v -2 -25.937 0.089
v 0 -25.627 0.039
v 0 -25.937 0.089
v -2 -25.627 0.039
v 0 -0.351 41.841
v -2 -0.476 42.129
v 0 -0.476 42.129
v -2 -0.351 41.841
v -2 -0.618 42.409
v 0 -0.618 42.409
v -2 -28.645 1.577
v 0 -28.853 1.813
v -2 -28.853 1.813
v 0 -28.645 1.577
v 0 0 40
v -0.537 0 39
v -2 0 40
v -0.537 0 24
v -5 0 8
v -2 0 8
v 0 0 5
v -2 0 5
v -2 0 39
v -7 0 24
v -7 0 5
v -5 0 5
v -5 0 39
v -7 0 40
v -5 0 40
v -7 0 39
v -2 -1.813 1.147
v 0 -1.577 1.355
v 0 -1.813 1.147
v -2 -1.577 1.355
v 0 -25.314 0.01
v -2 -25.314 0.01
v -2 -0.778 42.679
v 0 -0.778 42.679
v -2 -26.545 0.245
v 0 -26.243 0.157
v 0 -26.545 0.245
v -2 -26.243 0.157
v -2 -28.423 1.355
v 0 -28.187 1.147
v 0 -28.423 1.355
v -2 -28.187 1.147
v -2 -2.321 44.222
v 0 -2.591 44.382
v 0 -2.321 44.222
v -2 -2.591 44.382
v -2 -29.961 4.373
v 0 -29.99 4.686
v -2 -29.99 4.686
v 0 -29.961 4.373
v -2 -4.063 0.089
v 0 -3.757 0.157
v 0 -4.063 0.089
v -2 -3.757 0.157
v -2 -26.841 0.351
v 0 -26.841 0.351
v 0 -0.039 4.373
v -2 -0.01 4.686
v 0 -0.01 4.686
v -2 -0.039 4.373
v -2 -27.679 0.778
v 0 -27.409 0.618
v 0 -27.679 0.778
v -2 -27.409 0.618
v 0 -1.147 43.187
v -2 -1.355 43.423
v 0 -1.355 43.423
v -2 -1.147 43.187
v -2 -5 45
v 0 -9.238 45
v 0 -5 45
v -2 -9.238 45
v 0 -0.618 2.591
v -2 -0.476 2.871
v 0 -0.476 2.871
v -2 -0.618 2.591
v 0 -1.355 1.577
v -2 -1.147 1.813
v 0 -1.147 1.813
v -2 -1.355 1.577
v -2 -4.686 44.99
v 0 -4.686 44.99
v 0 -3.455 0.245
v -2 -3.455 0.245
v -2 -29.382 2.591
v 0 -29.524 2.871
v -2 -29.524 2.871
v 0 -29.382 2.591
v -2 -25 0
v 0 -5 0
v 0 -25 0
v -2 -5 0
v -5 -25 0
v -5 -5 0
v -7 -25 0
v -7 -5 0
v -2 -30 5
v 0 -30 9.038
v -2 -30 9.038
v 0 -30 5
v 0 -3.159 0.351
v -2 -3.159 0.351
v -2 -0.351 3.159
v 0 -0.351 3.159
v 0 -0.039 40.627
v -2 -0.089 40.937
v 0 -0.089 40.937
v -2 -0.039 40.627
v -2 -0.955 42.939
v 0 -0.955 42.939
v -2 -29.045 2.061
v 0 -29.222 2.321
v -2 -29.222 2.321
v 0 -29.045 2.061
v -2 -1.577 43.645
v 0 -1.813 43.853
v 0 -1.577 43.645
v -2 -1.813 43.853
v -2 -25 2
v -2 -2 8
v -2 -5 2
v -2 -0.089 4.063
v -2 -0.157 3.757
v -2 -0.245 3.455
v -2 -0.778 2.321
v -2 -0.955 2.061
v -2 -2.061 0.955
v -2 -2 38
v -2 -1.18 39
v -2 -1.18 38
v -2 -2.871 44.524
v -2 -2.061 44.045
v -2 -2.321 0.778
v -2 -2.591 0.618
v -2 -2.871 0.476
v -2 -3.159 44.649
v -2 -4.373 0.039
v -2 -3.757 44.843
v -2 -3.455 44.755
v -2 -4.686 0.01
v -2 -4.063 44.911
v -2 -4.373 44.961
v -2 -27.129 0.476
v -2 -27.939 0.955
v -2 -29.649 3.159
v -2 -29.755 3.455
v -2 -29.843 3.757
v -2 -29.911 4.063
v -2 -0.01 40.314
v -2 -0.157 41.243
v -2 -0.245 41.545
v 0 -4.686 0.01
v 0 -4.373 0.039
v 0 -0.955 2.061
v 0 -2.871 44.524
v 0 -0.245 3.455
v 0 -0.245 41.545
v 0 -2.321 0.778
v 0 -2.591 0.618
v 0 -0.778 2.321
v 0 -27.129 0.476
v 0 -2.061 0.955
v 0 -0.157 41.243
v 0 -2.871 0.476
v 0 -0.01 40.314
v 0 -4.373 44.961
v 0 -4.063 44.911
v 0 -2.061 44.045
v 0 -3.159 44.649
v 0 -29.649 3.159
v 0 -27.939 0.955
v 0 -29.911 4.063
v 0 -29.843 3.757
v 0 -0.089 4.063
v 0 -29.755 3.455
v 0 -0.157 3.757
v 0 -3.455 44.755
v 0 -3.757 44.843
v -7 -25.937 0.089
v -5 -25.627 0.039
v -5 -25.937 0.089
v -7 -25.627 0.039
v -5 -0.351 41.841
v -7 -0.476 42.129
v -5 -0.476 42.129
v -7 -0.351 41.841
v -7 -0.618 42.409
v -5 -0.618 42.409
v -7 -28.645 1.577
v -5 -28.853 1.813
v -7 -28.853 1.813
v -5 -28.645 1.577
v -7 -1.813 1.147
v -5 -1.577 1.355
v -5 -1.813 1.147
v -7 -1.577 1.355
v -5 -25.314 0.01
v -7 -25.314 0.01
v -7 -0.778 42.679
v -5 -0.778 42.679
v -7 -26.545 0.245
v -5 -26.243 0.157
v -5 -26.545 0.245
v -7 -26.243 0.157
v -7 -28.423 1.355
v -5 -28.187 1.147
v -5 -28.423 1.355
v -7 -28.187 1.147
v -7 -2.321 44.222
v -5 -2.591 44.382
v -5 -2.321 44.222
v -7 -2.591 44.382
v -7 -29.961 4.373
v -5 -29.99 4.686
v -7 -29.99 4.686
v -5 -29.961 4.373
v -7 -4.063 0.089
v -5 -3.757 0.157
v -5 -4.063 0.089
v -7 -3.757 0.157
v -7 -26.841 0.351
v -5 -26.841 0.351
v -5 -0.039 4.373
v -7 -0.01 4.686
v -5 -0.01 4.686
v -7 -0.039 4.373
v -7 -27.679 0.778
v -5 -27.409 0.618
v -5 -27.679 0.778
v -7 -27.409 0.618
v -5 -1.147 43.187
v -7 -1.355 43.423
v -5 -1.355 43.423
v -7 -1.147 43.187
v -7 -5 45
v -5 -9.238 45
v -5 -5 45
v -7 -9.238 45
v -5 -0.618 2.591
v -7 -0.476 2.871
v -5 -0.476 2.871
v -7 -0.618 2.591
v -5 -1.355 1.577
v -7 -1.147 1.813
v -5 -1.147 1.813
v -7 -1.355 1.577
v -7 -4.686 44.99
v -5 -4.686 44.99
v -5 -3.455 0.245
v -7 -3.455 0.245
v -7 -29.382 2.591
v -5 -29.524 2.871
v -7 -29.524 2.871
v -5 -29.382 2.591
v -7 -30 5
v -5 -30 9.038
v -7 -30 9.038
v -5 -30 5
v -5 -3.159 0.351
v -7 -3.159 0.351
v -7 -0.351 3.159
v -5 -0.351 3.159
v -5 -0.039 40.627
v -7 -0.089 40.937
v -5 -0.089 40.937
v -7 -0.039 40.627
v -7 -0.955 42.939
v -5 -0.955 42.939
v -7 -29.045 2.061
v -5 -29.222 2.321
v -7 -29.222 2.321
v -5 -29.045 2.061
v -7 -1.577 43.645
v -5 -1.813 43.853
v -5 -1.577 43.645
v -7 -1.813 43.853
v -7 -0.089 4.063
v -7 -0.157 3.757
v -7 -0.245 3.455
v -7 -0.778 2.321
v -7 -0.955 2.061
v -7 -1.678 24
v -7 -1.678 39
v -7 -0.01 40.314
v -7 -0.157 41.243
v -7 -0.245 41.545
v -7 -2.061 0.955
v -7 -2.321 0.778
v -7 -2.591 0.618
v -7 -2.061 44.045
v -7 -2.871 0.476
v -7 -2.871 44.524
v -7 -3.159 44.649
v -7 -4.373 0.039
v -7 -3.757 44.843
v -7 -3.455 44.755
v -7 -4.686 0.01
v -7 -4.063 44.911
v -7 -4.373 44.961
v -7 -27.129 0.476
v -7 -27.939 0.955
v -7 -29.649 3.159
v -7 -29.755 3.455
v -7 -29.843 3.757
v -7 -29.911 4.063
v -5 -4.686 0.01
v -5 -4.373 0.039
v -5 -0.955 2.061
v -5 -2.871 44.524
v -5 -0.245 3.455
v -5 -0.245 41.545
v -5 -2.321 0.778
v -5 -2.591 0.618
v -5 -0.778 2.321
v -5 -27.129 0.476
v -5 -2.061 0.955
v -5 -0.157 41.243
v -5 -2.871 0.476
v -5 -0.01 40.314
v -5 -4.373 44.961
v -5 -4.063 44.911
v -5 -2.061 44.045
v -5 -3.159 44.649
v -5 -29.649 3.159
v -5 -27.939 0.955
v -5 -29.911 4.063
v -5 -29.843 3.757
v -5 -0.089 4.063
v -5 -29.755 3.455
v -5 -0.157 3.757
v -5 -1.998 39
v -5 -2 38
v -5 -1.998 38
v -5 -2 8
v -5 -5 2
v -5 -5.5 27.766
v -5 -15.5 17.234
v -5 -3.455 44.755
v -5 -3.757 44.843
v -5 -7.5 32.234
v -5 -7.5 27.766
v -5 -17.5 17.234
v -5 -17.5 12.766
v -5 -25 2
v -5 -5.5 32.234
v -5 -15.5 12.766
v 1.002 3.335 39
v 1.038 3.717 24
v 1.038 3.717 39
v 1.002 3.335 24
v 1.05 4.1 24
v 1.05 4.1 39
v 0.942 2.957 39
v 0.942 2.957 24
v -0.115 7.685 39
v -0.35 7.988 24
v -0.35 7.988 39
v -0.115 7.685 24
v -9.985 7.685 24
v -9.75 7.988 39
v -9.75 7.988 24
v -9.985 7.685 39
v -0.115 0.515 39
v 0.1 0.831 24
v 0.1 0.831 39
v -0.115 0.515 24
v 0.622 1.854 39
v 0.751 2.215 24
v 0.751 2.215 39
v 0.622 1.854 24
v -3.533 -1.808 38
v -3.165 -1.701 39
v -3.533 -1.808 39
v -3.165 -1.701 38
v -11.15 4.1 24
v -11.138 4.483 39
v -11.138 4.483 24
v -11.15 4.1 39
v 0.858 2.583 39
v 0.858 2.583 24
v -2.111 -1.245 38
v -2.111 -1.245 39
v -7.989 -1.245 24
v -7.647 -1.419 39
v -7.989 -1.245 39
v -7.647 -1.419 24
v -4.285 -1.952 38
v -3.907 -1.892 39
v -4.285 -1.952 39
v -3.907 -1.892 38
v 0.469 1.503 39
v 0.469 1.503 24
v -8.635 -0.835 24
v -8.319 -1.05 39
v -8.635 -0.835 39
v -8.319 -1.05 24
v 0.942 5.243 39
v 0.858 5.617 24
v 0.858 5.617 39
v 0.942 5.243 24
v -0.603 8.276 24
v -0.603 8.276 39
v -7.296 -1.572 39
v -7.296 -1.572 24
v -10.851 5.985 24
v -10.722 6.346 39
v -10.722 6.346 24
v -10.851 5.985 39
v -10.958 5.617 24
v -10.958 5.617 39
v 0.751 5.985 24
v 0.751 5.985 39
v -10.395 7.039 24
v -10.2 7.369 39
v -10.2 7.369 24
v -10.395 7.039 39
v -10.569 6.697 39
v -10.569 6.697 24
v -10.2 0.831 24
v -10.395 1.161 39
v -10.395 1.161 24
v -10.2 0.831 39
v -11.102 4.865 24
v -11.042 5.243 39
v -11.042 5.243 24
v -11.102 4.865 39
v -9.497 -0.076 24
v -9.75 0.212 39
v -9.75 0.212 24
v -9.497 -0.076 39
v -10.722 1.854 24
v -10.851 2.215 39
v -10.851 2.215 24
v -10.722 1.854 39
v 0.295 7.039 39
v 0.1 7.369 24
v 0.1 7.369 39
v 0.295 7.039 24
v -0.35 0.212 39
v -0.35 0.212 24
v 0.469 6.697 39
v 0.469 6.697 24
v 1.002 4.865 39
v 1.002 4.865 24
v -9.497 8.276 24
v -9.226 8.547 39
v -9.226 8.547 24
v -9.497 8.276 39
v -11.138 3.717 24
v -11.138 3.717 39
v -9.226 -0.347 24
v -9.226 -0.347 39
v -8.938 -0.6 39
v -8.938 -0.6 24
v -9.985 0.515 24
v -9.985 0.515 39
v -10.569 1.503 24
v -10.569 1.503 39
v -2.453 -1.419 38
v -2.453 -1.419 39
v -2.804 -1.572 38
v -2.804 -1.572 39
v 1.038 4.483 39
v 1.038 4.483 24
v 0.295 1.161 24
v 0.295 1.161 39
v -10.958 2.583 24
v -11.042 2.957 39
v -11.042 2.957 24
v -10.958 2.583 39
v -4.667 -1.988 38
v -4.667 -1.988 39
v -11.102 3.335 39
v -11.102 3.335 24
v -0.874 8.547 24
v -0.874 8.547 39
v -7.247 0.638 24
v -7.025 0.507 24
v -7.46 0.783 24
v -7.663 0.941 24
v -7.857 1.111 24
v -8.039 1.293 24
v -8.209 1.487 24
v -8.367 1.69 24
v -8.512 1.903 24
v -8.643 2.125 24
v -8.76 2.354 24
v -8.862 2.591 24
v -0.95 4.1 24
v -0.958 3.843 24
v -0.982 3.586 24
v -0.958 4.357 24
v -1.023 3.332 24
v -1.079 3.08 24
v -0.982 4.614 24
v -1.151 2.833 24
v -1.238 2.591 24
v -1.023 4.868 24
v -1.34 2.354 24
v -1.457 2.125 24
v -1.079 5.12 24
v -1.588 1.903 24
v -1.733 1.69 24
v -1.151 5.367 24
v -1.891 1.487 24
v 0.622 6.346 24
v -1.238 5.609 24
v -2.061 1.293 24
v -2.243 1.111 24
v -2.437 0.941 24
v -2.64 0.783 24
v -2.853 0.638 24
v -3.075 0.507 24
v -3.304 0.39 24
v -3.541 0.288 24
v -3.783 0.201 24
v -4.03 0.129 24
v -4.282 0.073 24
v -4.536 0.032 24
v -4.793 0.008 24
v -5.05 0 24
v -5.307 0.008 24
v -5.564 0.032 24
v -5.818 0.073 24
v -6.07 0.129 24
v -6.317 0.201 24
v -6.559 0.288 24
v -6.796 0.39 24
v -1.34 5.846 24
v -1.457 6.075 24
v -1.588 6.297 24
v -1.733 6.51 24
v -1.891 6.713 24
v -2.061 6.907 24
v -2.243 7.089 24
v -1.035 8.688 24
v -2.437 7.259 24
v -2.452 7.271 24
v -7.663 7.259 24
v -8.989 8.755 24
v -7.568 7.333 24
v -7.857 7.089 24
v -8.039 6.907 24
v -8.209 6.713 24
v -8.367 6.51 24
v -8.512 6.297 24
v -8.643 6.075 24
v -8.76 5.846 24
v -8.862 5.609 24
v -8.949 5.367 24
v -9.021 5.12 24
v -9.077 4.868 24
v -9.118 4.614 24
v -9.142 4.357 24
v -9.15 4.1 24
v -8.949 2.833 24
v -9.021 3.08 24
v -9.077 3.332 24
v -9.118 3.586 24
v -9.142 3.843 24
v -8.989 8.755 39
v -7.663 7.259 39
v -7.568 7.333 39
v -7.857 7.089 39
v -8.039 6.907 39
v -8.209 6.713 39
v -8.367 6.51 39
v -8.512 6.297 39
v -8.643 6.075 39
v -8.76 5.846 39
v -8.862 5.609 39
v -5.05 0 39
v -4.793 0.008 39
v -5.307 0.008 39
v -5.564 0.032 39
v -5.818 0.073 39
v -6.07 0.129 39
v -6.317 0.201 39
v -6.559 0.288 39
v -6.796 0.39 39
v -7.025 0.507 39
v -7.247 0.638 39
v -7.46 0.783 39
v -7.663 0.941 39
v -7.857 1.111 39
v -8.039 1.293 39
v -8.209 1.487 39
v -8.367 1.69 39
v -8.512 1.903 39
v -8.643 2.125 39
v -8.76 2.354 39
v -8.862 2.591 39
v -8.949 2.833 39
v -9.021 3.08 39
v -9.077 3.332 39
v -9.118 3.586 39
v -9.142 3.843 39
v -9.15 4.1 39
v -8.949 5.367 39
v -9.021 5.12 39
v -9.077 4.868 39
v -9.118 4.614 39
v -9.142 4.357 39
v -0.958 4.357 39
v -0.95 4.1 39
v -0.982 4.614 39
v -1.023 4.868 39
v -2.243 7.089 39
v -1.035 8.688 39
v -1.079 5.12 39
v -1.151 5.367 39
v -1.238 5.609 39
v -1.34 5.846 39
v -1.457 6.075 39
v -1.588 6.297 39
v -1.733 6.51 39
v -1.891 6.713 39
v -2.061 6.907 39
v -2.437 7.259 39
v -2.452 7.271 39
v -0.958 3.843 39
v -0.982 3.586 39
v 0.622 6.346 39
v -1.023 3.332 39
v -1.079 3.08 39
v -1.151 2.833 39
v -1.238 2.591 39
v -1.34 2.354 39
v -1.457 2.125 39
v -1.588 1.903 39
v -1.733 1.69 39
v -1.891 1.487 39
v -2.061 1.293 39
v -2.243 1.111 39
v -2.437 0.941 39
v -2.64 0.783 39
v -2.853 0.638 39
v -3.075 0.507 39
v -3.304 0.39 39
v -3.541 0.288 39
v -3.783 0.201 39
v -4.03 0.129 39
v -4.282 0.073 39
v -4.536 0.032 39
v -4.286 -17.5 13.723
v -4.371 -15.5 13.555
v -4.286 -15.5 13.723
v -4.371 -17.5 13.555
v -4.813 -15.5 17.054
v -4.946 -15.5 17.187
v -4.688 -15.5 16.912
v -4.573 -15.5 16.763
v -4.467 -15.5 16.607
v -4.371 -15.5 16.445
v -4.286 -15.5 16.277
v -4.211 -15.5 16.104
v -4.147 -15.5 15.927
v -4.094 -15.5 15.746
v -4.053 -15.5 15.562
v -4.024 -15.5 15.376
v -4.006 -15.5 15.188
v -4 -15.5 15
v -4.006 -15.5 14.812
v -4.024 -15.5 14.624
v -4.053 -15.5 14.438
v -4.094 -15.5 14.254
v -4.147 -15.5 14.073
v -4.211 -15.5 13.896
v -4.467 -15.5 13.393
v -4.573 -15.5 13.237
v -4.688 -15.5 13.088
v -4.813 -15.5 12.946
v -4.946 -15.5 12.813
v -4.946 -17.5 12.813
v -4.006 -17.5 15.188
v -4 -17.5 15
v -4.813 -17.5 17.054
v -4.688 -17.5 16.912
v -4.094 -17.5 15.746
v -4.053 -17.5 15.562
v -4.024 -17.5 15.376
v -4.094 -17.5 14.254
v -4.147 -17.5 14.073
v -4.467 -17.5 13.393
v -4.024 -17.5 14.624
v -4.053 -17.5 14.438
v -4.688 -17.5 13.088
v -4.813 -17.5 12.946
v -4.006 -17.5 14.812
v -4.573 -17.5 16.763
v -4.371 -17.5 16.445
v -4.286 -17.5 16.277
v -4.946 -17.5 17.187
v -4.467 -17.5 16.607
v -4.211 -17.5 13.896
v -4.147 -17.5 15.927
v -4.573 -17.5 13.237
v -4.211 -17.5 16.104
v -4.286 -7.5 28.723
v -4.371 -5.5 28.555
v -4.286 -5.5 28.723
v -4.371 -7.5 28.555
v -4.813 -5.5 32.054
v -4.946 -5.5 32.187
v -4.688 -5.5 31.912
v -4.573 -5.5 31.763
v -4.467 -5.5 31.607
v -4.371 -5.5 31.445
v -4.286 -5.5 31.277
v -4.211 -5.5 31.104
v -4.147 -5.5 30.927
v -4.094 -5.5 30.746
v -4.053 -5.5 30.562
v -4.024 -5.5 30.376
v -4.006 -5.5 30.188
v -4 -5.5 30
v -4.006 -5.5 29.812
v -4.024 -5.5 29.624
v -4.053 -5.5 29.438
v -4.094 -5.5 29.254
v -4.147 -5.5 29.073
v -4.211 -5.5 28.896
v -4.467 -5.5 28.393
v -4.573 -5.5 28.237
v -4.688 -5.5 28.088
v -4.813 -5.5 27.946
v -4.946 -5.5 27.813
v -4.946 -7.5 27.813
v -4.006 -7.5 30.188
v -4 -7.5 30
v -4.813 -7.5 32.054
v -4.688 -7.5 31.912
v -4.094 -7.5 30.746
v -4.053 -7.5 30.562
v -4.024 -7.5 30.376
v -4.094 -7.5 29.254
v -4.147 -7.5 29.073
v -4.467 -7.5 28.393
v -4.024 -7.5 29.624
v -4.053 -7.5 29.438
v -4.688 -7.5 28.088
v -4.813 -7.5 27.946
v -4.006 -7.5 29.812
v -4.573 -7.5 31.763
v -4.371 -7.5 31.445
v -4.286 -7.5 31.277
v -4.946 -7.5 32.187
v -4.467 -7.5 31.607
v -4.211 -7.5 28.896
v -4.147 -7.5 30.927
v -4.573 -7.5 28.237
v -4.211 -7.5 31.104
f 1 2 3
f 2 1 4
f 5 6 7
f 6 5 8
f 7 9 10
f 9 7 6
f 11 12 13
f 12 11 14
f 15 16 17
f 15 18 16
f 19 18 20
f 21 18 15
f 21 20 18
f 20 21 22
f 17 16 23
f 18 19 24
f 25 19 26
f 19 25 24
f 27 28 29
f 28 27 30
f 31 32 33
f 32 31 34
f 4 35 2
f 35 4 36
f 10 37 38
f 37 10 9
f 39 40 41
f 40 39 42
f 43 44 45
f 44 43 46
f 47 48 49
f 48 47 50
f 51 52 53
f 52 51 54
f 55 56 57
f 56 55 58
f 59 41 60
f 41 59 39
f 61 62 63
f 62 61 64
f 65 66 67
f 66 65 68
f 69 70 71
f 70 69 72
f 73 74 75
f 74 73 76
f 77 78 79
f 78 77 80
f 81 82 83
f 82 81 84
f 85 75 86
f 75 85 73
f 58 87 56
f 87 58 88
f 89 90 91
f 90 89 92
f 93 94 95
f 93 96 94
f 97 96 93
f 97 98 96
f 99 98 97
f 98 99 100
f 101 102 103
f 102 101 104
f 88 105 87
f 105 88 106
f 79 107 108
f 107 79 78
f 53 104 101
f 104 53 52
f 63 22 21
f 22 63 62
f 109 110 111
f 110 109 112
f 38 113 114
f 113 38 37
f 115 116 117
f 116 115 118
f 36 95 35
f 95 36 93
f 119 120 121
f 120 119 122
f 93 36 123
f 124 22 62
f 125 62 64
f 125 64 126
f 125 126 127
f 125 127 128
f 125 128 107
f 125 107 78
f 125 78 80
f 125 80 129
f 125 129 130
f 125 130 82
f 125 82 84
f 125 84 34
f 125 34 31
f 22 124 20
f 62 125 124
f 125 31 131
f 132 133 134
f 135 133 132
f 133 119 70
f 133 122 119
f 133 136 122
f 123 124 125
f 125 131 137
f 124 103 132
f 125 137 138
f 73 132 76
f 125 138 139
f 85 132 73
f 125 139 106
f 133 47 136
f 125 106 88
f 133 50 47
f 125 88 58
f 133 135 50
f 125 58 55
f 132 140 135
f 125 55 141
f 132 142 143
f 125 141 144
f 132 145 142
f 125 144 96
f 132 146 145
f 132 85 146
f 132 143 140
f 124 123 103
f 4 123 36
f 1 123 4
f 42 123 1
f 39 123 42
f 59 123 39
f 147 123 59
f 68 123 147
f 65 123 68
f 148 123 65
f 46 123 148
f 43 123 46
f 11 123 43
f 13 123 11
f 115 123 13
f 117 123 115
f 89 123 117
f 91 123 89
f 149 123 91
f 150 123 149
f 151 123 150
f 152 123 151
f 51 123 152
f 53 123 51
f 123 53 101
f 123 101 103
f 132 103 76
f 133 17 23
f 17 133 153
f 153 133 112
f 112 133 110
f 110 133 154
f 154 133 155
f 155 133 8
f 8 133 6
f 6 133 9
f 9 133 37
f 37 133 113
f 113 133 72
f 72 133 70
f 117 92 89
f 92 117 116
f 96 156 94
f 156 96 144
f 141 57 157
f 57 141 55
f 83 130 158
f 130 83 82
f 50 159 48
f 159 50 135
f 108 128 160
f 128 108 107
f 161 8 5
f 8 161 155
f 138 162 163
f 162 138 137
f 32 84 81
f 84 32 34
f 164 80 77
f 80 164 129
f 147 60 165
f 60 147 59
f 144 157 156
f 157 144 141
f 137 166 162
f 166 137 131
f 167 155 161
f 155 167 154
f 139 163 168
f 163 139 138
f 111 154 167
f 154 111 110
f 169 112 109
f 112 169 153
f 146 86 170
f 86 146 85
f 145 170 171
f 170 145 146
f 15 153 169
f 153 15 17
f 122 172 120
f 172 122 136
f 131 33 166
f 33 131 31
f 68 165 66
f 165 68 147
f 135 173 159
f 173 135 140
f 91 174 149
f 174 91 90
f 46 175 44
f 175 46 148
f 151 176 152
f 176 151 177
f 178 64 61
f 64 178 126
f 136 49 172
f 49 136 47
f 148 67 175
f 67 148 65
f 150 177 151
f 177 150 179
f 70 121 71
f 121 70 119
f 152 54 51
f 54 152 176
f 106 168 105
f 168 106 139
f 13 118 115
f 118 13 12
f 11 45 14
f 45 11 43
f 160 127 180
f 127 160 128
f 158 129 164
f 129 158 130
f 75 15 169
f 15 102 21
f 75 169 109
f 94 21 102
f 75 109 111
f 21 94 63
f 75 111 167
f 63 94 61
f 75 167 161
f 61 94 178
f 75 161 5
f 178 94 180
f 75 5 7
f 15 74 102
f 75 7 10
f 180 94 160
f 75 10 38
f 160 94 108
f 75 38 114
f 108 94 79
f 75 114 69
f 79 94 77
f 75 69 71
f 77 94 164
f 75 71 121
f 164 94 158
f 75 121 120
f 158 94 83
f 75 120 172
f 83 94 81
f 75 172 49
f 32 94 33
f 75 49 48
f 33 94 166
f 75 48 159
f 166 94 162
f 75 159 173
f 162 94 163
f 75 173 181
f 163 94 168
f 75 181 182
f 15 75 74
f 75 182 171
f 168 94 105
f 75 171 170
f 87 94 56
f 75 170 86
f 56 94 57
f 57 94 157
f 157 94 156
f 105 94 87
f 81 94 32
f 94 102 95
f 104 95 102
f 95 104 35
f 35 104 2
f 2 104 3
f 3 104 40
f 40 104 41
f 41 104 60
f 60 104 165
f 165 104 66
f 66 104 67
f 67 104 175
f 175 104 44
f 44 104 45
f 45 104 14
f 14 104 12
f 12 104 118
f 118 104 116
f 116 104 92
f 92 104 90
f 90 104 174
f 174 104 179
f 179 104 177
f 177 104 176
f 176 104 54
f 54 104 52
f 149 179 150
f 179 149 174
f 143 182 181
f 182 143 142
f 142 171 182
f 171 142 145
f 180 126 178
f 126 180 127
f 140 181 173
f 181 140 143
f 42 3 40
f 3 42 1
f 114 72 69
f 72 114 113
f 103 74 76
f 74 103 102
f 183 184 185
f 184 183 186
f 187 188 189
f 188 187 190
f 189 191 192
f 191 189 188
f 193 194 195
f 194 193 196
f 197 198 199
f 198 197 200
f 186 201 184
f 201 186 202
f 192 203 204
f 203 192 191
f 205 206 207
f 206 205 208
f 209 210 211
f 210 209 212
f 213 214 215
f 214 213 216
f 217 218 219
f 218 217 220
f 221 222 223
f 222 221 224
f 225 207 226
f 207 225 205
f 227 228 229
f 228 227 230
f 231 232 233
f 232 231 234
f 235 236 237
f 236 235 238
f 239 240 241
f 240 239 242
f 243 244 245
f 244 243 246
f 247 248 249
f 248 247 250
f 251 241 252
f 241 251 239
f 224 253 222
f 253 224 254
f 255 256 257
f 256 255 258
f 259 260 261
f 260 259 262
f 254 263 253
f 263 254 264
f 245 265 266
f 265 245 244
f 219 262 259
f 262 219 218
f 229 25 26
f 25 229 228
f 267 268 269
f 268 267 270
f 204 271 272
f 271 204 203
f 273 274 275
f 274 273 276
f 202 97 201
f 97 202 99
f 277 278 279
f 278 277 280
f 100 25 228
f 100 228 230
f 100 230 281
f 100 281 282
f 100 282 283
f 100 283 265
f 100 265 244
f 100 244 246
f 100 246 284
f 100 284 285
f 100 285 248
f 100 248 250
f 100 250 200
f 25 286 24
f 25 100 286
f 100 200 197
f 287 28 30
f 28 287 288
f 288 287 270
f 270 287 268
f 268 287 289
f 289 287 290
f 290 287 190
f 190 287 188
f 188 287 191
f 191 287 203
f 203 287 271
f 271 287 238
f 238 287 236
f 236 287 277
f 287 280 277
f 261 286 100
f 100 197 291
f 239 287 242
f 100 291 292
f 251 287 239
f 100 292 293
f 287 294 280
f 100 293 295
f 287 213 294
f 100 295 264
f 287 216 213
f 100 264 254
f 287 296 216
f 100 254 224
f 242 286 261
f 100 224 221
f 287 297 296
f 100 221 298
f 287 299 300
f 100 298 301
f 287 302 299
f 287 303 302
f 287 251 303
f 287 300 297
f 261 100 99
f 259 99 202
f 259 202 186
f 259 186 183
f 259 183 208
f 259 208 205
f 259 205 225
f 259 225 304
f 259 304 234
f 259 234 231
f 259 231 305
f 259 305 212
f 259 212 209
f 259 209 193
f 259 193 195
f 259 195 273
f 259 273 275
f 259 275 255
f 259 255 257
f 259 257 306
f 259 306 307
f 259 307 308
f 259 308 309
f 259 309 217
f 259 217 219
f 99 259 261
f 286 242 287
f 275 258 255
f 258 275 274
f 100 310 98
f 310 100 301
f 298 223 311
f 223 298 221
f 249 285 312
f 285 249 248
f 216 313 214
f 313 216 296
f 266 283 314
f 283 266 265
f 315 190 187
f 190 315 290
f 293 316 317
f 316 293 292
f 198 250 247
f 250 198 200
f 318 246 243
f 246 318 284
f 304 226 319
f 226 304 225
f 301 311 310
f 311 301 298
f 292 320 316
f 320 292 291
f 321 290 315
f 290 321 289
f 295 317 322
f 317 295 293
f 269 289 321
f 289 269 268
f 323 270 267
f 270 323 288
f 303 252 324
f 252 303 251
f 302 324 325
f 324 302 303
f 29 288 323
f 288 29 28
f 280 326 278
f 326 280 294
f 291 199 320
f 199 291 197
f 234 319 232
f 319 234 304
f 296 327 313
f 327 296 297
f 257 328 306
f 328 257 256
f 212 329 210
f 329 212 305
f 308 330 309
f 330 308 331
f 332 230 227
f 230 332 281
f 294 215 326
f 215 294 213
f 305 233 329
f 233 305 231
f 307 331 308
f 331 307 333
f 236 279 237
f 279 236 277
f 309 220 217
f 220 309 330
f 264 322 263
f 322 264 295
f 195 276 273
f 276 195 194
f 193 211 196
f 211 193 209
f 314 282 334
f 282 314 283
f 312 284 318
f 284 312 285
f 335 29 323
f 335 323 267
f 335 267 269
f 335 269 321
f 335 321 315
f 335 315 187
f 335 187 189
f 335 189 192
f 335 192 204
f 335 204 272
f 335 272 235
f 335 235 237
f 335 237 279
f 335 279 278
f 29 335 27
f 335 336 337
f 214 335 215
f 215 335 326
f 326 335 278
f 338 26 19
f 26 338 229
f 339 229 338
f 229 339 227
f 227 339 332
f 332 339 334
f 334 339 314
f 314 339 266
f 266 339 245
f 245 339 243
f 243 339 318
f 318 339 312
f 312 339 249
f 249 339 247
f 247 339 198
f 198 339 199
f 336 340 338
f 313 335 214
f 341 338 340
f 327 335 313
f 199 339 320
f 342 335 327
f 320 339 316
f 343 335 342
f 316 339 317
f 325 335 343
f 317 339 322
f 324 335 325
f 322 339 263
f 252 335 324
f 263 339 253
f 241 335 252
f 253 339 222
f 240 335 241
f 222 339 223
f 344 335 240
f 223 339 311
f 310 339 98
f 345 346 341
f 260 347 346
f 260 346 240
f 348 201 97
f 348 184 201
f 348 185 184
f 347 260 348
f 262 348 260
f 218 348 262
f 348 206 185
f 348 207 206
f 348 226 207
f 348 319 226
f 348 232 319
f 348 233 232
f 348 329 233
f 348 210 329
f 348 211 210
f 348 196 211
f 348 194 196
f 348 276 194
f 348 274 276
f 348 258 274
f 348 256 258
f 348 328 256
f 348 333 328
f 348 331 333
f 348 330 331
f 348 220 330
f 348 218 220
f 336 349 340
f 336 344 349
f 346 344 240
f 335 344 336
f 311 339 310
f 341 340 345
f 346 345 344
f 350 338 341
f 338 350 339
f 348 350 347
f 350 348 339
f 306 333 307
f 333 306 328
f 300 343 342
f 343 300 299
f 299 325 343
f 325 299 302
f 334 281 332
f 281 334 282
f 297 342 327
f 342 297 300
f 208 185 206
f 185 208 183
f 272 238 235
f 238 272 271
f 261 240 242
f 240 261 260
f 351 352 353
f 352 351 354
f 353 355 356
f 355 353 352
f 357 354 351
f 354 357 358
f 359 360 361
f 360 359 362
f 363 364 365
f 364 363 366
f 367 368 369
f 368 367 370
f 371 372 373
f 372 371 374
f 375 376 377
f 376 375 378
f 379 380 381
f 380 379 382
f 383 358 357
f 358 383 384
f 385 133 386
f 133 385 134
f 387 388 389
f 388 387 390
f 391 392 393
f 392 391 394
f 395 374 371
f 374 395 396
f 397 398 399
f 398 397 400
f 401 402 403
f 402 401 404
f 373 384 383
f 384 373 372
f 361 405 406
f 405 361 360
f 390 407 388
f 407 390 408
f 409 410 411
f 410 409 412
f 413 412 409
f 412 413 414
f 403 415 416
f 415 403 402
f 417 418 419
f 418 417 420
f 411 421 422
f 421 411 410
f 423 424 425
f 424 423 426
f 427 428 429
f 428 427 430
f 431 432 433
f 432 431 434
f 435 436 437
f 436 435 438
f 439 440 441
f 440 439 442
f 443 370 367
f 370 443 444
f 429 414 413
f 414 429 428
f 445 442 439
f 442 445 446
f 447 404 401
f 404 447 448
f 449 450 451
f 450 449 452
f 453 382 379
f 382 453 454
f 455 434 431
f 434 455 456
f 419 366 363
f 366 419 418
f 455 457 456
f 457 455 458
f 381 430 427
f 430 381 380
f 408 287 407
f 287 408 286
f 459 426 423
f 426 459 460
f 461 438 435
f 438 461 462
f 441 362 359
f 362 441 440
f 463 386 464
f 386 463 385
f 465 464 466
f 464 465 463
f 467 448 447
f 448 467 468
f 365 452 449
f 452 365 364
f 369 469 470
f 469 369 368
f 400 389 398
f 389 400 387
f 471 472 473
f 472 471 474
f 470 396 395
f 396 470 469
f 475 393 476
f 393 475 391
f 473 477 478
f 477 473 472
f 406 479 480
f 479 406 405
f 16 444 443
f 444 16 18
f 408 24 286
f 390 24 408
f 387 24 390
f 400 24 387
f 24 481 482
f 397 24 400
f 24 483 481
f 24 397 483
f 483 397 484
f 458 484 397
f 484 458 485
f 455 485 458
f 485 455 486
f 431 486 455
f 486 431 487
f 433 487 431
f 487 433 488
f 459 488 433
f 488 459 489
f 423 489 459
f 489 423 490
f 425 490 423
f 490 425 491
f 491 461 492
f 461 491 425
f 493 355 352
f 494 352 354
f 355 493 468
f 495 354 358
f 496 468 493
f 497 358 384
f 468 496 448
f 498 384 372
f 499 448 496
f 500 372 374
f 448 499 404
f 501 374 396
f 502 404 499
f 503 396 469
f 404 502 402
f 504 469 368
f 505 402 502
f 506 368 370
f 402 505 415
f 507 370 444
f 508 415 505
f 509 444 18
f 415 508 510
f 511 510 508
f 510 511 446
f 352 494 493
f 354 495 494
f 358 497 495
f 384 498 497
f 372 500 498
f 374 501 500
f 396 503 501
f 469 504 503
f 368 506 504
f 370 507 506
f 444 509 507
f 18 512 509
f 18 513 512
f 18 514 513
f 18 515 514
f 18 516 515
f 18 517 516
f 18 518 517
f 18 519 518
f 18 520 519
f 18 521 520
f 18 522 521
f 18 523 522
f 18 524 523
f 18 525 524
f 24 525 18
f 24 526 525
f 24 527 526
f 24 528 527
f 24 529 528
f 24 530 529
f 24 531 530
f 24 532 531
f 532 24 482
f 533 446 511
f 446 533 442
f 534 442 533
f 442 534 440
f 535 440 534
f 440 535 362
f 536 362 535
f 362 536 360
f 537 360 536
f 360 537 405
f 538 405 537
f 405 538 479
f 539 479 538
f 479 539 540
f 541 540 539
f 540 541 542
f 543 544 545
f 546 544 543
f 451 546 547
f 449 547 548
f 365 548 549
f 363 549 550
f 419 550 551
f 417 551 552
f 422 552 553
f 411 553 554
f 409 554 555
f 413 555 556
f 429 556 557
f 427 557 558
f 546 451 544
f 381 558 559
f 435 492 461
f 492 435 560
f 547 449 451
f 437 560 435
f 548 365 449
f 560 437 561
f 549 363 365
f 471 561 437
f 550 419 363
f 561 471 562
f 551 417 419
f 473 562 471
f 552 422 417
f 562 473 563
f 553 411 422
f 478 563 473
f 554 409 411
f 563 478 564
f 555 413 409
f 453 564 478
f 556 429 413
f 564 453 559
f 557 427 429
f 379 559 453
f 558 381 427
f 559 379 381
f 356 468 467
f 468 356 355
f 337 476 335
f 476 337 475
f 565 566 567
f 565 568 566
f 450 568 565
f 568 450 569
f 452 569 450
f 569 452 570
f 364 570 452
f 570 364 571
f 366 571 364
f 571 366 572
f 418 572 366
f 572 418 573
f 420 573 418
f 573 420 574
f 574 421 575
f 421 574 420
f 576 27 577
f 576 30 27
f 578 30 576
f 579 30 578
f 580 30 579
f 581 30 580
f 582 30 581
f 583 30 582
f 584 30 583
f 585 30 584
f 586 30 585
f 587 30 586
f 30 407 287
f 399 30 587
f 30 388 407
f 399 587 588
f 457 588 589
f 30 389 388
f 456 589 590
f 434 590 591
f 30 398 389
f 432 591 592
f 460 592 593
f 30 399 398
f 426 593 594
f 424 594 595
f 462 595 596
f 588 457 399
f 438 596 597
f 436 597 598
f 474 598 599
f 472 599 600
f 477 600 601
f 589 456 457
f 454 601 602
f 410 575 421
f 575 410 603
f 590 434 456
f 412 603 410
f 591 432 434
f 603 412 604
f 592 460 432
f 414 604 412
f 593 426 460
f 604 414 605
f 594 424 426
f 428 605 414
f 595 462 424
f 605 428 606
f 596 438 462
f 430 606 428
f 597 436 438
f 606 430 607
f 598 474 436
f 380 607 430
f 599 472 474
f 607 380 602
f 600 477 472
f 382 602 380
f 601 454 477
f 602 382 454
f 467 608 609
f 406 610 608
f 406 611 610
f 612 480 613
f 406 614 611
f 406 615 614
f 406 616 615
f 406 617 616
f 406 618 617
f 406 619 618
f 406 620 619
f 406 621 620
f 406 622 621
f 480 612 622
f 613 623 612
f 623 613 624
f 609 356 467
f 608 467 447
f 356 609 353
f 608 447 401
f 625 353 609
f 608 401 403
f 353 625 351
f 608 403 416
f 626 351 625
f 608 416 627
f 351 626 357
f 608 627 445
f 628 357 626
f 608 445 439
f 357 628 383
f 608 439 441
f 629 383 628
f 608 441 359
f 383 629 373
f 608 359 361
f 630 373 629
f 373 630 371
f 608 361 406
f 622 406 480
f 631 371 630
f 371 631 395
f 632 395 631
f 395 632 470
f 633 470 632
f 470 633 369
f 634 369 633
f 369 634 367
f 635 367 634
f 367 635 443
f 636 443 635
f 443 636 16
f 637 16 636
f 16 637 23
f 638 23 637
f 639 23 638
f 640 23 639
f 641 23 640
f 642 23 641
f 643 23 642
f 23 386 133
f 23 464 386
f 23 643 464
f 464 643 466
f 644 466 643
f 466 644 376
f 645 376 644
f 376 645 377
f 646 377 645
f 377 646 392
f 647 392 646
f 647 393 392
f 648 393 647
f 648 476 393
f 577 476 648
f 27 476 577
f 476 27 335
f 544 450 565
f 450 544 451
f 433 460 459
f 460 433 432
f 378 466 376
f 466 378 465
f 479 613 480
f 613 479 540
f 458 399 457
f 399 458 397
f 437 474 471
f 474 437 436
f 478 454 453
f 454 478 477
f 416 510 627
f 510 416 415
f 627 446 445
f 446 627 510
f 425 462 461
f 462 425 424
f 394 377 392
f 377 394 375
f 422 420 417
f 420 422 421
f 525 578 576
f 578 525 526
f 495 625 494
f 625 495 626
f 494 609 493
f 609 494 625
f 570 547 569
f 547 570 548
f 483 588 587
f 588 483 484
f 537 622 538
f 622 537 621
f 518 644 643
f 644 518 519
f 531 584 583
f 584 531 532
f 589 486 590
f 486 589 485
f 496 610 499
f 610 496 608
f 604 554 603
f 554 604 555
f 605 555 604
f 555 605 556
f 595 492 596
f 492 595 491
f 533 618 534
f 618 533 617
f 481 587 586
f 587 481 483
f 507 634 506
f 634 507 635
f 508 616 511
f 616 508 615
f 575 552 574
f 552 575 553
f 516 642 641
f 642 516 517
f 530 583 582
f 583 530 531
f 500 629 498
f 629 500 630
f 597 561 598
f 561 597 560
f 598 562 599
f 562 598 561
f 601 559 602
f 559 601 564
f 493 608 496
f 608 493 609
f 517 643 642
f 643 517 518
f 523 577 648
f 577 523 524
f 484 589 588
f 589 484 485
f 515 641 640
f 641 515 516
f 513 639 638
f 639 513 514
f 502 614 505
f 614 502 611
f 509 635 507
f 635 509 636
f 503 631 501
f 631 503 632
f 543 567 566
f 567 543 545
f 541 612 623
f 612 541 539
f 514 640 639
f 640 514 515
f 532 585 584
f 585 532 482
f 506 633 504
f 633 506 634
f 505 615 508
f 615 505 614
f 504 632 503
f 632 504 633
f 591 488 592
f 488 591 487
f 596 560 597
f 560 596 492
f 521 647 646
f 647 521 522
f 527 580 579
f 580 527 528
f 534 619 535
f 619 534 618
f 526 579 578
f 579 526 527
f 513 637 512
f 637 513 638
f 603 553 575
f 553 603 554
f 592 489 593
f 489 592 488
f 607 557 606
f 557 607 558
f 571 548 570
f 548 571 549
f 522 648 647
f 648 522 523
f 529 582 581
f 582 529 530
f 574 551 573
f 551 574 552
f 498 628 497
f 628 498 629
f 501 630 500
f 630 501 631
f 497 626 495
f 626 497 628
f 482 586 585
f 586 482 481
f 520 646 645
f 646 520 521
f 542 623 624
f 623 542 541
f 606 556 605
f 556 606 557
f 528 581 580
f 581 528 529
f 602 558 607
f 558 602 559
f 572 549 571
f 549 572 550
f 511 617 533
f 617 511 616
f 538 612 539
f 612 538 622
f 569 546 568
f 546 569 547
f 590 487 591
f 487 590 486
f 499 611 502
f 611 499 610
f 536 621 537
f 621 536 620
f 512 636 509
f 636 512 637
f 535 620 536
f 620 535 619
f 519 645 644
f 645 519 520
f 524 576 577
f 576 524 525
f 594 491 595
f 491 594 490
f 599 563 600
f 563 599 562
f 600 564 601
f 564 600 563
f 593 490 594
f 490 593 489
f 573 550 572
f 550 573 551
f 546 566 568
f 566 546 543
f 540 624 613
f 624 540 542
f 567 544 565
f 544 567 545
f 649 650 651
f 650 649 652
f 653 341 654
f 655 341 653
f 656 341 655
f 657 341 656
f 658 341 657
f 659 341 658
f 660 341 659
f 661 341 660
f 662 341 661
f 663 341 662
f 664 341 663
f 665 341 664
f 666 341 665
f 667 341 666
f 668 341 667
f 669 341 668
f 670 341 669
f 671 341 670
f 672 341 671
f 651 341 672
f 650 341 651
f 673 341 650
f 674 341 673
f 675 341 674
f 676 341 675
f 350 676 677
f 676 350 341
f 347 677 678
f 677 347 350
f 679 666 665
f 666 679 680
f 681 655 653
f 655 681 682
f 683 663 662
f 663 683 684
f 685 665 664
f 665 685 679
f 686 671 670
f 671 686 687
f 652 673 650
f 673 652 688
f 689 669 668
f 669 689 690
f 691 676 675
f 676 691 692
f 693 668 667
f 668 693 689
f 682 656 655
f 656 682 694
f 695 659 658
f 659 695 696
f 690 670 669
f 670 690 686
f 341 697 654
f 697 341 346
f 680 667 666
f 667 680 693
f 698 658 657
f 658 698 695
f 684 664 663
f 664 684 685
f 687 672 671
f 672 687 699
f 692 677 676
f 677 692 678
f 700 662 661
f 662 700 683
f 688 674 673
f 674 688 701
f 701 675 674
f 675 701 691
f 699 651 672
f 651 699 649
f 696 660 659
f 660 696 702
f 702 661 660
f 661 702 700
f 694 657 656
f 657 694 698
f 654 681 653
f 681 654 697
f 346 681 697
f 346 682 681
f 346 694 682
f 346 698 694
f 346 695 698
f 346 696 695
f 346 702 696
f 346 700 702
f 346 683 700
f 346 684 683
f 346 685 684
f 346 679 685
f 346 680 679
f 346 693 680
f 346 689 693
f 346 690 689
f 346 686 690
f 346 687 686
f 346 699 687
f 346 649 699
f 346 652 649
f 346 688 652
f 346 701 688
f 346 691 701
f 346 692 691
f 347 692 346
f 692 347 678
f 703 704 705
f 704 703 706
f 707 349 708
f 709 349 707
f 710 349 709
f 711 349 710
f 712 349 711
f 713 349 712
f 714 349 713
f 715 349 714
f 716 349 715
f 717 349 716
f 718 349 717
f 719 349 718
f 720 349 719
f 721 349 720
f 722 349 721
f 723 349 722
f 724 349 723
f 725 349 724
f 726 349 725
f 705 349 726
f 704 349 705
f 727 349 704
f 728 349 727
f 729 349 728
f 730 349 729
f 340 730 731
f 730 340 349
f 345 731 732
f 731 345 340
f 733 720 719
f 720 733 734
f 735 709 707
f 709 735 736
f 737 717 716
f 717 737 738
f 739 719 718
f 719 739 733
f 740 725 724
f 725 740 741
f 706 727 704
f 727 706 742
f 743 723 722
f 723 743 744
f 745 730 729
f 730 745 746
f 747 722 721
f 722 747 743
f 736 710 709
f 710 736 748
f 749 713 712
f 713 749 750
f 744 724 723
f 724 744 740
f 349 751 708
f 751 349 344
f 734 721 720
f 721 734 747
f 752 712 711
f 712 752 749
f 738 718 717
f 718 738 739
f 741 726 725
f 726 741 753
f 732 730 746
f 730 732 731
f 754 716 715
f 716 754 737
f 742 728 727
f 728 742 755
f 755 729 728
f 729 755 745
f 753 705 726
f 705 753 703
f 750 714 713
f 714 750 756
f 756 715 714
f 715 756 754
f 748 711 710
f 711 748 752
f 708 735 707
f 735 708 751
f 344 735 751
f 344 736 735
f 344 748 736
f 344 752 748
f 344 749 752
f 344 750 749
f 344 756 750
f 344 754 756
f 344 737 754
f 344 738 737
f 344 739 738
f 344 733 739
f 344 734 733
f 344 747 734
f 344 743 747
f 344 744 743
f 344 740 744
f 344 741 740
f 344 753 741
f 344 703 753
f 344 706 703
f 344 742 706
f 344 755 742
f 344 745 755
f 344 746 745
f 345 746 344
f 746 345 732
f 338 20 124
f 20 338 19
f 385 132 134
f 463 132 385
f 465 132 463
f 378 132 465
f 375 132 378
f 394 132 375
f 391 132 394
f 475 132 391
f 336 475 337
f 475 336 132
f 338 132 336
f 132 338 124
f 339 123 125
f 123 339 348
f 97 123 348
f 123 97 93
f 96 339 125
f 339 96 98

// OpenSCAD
// file: atoi.scad
function atoi(a)=
(a=="!")?33:
(a=="\"")?34:
(a=="#")?35:
(a=="$")?36:
(a=="%")?37:
(a=="&")?38:
(a=="'")?39:
(a=="(")?40:
(a==")")?41:
(a=="*")?42:
(a=="+")?43:
(a==",")?44:
(a=="-")?45:
(a==".")?46:
(a=="/")?47:
(a=="0")?48:
(a=="1")?49:
(a=="2")?50:
(a=="3")?51:
(a=="4")?52:
(a=="5")?53:
(a=="6")?54:
(a=="7")?55:
(a=="8")?56:
(a=="9")?57:
(a==":")?58:
(a==";")?59:
(a=="<")?60:
(a=="=")?61:
(a==">")?62:
(a=="?")?63:
(a=="@")?64:
(a=="A")?65:
(a=="B")?66:
(a=="C")?67:
(a=="D")?68:
(a=="E")?69:
(a=="F")?70:
(a=="G")?71:
(a=="H")?72:
(a=="I")?73:
(a=="J")?74:
(a=="K")?75:
(a=="L")?76:
(a=="M")?77:
(a=="N")?78:
(a=="O")?79:
(a=="P")?80:
(a=="Q")?81:
(a=="R")?82:
(a=="S")?83:
(a=="T")?84:
(a=="U")?85:
(a=="V")?86:
(a=="W")?87:
(a=="X")?88:
(a=="Y")?89:
(a=="Z")?90:
(a=="[")?91:
(a=="\\")?92:
(a=="]")?93:
(a=="^")?94:
(a=="_")?95:
(a=="`")?96:
(a=="a")?97:
(a=="b")?98:
(a=="c")?99:
(a=="d")?100:
(a=="e")?101:
(a=="f")?102:
(a=="g")?103:
(a=="h")?104:
(a=="i")?105:
(a=="j")?106:
(a=="k")?107:
(a=="l")?108:
(a=="m")?109:
(a=="n")?110:
(a=="o")?111:
(a=="p")?112:
(a=="q")?113:
(a=="r")?114:
(a=="s")?115:
(a=="t")?116:
(a=="u")?117:
(a=="v")?118:
(a=="w")?119:
(a=="x")?120:
(a=="y")?121:
(a=="z")?122:
(a=="{")?123:
(a=="|")?124:
(a=="}")?125:
(a=="~")?126:
(a=="€")?128:
(a=="‚")?130:
(a=="ƒ")?131:
(a=="„")?132:
(a=="…")?133:
(a=="†")?134:
(a=="‡")?135:
(a=="ˆ")?136:
(a=="‰")?137:
(a=="Š")?138:
(a=="‹")?139:
(a=="Œ")?140:
(a=="Ž")?142:
(a=="‘")?145:
(a=="’")?146:
(a=="“")?147:
(a=="”")?148:
(a=="•")?149:
(a=="–")?150:
(a=="—")?151:
(a=="˜")?152:
(a=="™")?153:
(a=="š")?154:
(a=="›")?155:
(a=="œ")?156:
(a=="ž")?158:
(a=="Ÿ")?159:
(a=="¡")?161:
(a=="¢")?162:
(a=="£")?163:
(a=="¤")?164:
(a=="¥")?165:
(a=="¦")?166:
(a=="§")?167:
(a=="¨")?168:
(a=="©")?169:
(a=="ª")?170:
(a=="«")?171:
(a=="¬")?172:
(a=="®")?174:
(a=="¯")?175:
(a=="°")?176:
(a=="±")?177:
(a=="²")?178:
(a=="³")?179:
(a=="´")?180:
(a=="µ")?181:
(a=="¶")?182:
(a=="·")?183:
(a=="¸")?184:
(a=="¹")?185:
(a=="º")?186:
(a=="»")?187:
(a=="¼")?188:
(a=="½")?189:
(a=="¾")?190:
(a=="¿")?191:
(a=="À")?192:
(a=="Á")?193:
(a=="Â")?194:
(a=="Ã")?195:
(a=="Ä")?196:
(a=="Å")?197:
(a=="Æ")?198:
(a=="Ç")?199:
(a=="È")?200:
(a=="É")?201:
(a=="Ê")?202:
(a=="Ë")?203:
(a=="Ì")?204:
(a=="Í")?205:
(a=="Î")?206:
(a=="Ï")?207:
(a=="Ð")?208:
(a=="Ñ")?209:
(a=="Ò")?210:
(a=="Ó")?211:
(a=="Ô")?212:
(a=="Õ")?213:
(a=="Ö")?214:
(a=="×")?215:
(a=="Ø")?216:
(a=="Ù")?217:
(a=="Ú")?218:
(a=="Û")?219:
(a=="Ü")?220:
(a=="Ý")?221:
(a=="Þ")?222:
(a=="ß")?223:
(a=="à")?224:
(a=="á")?225:
(a=="â")?226:
(a=="ã")?227:
(a=="ä")?228:
(a=="å")?229:
(a=="æ")?230:
(a=="ç")?231:
(a=="è")?232:
(a=="é")?233:
(a=="ê")?234:
(a=="ë")?235:
(a=="ì")?236:
(a=="í")?237:
(a=="î")?238:
(a=="ï")?239:
(a=="ð")?240:
(a=="ñ")?241:
(a=="ò")?242:
(a=="ó")?243:
(a=="ô")?244:
(a=="õ")?245:
(a=="ö")?246:
(a=="÷")?247:
(a=="ø")?248:
(a=="ù")?249:
(a=="ú")?250:
(a=="û")?251:
(a=="ü")?252:
(a=="ý")?253:
(a=="þ")?254:
(a=="ÿ")?255:
0;
// file: write.scad
include <atoi.scad>;
module _write(font,s,h,p,i) {
	if(i<len(s)){
		if(s[i]==" "){
			translate([dxf_dim(file = font, name = str(atoi("-"),"_width")),0,0])
				_write(font,s,h,p,i+1);
		}else{
			linear_extrude(height=h) import(font,layer=atoi(s[i]));		
			translate([p+dxf_dim(file = font, name = str(atoi(s[i]),"_width")),0,0])
				_write(font,s,h,p,i+1);
		}
	}
}
module write(s,h,p){
	_write("GaroaHackerClubeBold.dxf",s,h,1,0);
}
module write_custom(font,s,h,p){
	_write(font,s,h,p,0);
}
// main file
//Last change 18 december 2013
include <write.scad>

supportWidth = 45;
supportHeight = 30;
supportThickness = 2;
coverThickness = 3;
penDia = 8.2/2;
penAttach=15;

$fn=100;


/* *************************************************
 * Mes fonctions à moi
 * *********************************************** */
module grip1() {
	translate([2*supportWidth/3,supportHeight/4,((2*supportThickness)+coverThickness)])
	translate([0,10,0])
	rotate (90,[1,0,0])
	difference() {
		cylinder(r=3,h=2);
		translate([-7,-0.2,-2]) cube([15,15,5]);
	}
}

module grip2() {
	translate([supportWidth/3,supportHeight/4,((2*supportThickness)+coverThickness)])
	rotate (90,[1,0,0])
	difference() {
		cylinder(r=3,h=2);
		translate([-7,-0.2,-2]) cube([15,15,5]);
	}
}

module grip3() {
	translate([2*supportWidth/3,supportHeight+20,((2*supportThickness)+coverThickness)]) 
	rotate (180,[1,0,00]) 
	rotate(90,[0,0,1]) 
		grip1();
}

module rectangleArrondi(x, y, z) {
  translate([2.5,2.5,0])
  hull() {
    cube([x-5,y-05,z]);

    translate([2.5,2.5,0])
    cylinder(r=5,h=z);

    translate([x-7.5,2.5,0])
    cylinder(r=5,h=z);

    translate([x-7.5,y-7.5,0])
    cylinder(r=5,h=z);

    translate([2.5,y-7.5,0])
    cylinder(r=5,h=z);
  }
}


module front() {
   difference()
   {
     rectangleArrondi(supportWidth,supportHeight,supportThickness);
     rotate(30, [0, 0, 1]) translate([-20,8,0]) 
     cube([150,supportHeight,supportThickness*4]);
   }
}

module back(){
   translate([0,0,supportThickness+coverThickness])
   difference()
   {
     rectangleArrondi(supportWidth,supportHeight,supportThickness);
     //rotate(45, [0, 0, 1]) translate([-20,5,0]) 
     rotate(30, [0, 0, 1]) translate([-20,8,0])
     cube([150,supportHeight,supportThickness*4]);
   };

}

module attach_1() {
   translate([7,0,supportThickness/2])
   cube([supportWidth-15,supportThickness,supportThickness+coverThickness]);
}

module attach_2() {
   translate([supportWidth-supportThickness,5,supportThickness/2])
   cube([supportThickness,supportHeight-10,supportThickness+coverThickness]);
}

module pen_support_1() {
	translate([6,-(penDia),(penDia/2)+coverThickness])
	rotate(90,[0,90,0])

	difference() {
		difference() {
			cylinder(h = penAttach, r=penDia+supportThickness);
			cylinder(h = penAttach, r=penDia);
		}

		translate([-7,-36,-5])
		rotate(45,[0,0,1])
		cube ([penAttach*2,20,30]);
	}
}

module text() {
	rotate(180,[0,1,0])
	rotate(90,[0,0,1])
	translate([7,5,-1])
	rotate(-90,[0,0,1])
	rotate(180,[0,0,1])
	write("ARNAUD",h=5,t=2,font="knewave.dxf",space=0.8);
}

/* ****** LA TOTALE ************************* */
translate([0,0,supportWidth])
rotate(-90,[0,1,0])
rotate(180,[0,0,1])
{
	front();
	text();
	back();
	attach_1();
	attach_2();
	pen_support_1();
	grip1();
	grip2();
	//grip3();

}
